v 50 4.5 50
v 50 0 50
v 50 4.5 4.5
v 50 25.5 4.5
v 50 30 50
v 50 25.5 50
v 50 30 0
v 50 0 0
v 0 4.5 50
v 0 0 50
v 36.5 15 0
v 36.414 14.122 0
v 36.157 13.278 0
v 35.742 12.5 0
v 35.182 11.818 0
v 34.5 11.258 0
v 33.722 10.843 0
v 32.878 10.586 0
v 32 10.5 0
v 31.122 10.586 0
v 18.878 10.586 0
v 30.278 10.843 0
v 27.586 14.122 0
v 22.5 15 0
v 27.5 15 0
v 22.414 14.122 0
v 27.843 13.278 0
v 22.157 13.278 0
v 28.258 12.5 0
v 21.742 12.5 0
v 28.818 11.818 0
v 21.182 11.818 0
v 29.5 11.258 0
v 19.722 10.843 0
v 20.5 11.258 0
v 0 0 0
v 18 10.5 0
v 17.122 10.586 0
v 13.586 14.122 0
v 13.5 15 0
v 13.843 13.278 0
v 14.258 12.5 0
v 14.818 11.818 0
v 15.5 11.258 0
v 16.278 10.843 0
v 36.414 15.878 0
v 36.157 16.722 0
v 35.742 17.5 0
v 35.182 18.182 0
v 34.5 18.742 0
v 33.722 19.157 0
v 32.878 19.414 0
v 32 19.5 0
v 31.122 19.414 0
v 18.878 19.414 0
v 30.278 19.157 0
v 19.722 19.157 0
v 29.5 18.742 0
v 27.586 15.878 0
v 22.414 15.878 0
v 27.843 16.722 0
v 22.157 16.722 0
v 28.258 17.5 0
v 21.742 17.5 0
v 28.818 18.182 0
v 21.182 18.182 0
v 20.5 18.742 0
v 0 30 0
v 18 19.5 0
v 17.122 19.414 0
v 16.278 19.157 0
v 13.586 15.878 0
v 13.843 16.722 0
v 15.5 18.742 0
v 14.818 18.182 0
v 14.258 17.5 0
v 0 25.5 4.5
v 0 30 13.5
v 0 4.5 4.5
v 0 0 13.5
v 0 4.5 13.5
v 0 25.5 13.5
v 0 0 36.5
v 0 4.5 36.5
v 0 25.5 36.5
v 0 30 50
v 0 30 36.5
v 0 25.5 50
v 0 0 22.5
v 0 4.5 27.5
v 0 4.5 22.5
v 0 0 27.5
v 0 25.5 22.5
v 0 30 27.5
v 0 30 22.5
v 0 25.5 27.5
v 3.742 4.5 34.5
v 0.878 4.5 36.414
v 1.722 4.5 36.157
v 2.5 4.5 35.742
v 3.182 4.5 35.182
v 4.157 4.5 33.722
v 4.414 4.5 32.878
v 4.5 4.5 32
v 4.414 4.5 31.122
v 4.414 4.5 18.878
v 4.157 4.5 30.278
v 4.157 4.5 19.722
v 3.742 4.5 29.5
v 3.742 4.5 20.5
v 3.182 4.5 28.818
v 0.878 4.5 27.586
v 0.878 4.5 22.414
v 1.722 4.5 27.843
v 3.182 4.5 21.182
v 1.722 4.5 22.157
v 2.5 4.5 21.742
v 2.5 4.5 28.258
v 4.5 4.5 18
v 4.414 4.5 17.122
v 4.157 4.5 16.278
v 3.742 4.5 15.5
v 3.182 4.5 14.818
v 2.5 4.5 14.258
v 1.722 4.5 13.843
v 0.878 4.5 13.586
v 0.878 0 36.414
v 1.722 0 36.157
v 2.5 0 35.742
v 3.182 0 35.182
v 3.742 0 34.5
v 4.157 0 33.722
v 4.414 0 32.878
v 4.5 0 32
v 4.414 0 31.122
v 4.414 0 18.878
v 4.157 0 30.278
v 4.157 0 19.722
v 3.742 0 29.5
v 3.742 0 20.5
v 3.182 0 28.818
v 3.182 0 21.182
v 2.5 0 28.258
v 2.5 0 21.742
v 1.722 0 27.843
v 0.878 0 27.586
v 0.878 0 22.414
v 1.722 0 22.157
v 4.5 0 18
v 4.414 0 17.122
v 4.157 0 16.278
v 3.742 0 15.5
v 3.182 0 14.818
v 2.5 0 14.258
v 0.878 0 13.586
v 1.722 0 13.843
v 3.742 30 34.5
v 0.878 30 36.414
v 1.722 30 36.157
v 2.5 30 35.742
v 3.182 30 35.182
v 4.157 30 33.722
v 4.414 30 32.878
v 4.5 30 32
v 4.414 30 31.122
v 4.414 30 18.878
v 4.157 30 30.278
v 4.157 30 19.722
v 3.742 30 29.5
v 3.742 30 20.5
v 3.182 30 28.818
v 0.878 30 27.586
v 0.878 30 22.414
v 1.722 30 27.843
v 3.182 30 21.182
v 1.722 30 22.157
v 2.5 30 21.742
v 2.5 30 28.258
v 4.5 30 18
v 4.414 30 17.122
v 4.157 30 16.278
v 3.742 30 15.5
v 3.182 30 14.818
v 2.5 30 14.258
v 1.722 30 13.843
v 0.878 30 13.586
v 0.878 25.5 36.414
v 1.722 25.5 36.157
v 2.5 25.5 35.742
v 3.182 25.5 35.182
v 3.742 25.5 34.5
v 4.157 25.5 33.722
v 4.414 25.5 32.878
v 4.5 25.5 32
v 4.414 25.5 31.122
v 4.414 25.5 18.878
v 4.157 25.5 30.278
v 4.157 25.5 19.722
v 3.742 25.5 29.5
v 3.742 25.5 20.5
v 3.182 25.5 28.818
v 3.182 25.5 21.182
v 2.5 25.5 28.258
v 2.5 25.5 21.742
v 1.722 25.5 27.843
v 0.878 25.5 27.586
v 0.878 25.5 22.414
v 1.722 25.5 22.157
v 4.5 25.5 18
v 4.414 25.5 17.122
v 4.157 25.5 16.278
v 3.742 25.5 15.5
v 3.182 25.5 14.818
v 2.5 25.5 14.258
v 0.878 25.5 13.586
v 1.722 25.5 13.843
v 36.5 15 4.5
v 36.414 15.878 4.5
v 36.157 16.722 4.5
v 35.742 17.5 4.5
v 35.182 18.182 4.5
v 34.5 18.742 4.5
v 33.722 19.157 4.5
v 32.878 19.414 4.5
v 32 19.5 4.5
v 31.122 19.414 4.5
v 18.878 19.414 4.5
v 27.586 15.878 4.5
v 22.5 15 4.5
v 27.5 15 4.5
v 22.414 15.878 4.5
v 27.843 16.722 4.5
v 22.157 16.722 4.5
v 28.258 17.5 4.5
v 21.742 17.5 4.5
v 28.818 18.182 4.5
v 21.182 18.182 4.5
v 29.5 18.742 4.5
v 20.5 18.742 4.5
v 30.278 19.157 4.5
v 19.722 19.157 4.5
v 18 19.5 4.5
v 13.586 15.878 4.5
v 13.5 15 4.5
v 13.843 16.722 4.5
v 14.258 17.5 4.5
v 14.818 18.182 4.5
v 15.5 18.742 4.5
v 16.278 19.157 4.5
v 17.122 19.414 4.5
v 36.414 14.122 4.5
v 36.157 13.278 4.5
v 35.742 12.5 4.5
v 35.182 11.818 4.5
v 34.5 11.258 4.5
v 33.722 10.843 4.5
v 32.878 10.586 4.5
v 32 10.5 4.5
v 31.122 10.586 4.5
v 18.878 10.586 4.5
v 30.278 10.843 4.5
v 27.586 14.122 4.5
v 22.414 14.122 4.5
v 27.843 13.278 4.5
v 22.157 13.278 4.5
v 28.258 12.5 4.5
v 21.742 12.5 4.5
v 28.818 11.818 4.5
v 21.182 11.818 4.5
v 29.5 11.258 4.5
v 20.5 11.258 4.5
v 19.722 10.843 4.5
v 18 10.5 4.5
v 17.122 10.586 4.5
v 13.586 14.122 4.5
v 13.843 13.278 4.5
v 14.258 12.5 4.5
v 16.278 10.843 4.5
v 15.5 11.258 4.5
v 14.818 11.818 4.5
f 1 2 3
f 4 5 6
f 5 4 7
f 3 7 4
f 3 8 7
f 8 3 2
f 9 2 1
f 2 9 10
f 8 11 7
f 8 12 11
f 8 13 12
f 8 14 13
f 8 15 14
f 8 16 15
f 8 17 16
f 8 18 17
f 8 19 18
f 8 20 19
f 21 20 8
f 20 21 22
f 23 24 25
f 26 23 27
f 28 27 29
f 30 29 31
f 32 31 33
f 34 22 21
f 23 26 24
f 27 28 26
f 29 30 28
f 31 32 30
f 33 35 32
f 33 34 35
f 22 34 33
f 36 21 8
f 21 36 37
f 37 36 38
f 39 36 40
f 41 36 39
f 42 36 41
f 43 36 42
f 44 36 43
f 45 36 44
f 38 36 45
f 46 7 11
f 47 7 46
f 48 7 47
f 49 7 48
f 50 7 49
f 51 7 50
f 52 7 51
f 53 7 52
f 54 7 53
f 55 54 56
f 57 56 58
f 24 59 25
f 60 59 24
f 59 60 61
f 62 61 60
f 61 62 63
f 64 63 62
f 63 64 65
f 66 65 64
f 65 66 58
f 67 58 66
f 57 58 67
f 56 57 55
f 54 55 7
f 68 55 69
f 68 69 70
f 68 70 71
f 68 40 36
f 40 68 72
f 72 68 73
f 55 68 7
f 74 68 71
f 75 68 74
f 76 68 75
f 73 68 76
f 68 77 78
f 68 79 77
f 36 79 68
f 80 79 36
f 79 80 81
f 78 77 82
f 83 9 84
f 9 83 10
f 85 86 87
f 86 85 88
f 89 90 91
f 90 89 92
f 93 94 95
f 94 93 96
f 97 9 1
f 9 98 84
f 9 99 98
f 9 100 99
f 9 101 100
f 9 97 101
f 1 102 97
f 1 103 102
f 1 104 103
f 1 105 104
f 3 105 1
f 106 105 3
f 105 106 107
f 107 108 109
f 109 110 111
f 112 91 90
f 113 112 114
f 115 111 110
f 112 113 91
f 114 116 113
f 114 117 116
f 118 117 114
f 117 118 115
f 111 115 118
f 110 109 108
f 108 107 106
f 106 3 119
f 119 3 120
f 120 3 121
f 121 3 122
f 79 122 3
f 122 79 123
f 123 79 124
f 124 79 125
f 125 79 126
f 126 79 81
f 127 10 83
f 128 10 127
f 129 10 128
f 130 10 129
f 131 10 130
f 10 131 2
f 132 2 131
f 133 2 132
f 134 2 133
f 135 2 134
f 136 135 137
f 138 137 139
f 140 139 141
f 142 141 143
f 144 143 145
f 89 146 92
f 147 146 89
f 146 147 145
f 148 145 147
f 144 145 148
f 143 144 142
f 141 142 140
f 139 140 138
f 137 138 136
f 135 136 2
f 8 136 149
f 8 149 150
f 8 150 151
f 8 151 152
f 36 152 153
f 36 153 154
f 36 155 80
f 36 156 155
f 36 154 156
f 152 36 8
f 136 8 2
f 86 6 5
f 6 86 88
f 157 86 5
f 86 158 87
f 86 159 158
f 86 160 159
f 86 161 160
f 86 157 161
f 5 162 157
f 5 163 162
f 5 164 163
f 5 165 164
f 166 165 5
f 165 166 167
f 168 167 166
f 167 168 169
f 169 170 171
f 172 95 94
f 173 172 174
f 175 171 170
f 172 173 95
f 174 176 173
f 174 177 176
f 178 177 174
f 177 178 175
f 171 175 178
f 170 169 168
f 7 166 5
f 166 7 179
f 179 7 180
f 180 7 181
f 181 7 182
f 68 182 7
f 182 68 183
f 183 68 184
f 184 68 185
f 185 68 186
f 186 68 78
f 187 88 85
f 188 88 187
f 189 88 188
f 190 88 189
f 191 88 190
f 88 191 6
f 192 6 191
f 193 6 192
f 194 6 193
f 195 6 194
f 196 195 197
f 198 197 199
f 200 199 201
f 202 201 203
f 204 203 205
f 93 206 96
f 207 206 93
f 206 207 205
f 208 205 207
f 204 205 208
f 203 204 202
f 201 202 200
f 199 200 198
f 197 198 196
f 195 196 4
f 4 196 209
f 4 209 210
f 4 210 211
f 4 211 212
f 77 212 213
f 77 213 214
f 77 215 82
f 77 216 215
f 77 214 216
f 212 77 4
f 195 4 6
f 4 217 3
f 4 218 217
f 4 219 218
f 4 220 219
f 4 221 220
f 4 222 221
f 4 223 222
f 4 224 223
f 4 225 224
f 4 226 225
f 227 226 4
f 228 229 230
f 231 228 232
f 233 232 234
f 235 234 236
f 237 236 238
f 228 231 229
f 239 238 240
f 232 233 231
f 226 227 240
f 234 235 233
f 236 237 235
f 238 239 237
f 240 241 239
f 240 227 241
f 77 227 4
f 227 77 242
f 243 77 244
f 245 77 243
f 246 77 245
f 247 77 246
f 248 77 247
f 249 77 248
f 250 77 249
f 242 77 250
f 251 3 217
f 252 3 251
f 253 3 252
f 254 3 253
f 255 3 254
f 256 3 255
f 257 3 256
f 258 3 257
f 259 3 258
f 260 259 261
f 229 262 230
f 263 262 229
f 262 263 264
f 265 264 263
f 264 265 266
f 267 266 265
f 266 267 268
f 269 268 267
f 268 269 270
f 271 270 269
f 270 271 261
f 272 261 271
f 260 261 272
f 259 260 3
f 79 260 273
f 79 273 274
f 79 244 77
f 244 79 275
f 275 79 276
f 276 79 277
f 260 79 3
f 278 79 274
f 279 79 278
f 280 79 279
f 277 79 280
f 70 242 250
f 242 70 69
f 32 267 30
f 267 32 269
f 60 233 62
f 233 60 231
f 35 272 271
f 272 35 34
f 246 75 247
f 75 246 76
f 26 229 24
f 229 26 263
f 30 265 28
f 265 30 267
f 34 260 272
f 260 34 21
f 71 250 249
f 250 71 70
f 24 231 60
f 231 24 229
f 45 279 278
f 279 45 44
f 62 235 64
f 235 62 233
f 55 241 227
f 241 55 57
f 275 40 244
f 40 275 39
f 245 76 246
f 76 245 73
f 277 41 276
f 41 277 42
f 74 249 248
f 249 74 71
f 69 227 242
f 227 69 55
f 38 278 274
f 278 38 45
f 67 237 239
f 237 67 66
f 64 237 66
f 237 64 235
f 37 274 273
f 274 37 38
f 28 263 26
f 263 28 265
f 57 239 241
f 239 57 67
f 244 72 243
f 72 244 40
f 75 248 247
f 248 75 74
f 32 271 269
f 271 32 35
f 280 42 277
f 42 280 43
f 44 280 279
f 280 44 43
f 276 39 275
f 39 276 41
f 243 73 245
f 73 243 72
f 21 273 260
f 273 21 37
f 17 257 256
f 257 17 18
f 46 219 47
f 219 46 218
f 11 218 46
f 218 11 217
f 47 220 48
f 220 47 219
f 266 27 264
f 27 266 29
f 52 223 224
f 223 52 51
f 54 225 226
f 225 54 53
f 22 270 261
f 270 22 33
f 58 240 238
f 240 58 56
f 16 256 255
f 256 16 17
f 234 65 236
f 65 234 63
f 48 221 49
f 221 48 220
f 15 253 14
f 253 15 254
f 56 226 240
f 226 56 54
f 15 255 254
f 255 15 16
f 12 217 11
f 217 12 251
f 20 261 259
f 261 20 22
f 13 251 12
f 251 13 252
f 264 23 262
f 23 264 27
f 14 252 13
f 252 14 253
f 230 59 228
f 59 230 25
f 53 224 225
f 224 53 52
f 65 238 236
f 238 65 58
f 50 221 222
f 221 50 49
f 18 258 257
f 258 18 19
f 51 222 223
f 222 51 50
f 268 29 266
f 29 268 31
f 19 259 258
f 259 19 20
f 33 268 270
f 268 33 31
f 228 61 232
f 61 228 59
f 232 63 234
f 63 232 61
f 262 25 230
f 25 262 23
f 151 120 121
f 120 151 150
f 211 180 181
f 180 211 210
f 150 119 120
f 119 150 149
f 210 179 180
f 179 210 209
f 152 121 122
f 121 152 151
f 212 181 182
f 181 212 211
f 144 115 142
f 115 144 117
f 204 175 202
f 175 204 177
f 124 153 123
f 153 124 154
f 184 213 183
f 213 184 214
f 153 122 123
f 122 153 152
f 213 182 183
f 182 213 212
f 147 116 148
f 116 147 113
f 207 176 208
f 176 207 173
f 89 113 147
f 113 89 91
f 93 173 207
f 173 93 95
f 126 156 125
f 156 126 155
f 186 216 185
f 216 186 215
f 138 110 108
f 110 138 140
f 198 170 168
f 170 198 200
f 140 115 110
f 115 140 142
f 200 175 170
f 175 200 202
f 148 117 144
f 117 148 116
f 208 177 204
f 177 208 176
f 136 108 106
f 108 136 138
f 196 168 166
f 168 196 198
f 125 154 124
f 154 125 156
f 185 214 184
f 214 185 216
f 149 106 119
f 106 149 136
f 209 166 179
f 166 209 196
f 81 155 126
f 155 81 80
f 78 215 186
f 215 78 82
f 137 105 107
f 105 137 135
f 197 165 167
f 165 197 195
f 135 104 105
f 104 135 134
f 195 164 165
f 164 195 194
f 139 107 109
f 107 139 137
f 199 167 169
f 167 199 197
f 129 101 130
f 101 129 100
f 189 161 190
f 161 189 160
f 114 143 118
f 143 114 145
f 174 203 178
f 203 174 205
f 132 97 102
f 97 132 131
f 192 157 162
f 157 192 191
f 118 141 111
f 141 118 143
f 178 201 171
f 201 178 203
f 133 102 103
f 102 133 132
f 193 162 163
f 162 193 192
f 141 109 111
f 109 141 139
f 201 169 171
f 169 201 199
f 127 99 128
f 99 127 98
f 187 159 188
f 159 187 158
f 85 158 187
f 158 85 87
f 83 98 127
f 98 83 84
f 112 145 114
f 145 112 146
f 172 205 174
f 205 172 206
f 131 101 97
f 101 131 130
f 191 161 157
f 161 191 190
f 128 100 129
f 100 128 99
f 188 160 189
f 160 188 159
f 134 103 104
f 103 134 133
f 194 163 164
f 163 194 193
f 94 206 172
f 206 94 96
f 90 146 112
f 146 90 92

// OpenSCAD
$fn = 32;

// ----------------------------------------------------------------------
// U-bracket: 50 x 30 x 50 mm
// ----------------------------------------------------------------------

// --- parameters (mm) ---
rail_len = 50;            // outer length, X
jaw_w = 30;               // outer width, Y
jaw_h = 50;               // upright height, Z
web_t = 4.5;              // wall thickness
hole_d = 9;               // clearance for M8

module hole_z(px, py) {
  translate([px, py, -2.5]) cylinder(h = web_t + 5, d = hole_d);
}
module hole_y_pz(pz) {
  /* through both uprights along Y */
  translate([0, -2.5, pz]) rotate([-90, 0, 0]) cylinder(h = jaw_w + 5, d = hole_d);
}

module base() {
  cube([rail_len, jaw_w, web_t]);
}

module uprights() {
  cube([rail_len, web_t, jaw_h]);
  translate([0, jaw_w - web_t, 0]) cube([rail_len, web_t, jaw_h]);
}

difference() {
  union() {
    base();
    uprights();
  }
  hole_z(18, 15);
  hole_z(32, 15);
  hole_y_pz(18);
  hole_y_pz(32);
}
